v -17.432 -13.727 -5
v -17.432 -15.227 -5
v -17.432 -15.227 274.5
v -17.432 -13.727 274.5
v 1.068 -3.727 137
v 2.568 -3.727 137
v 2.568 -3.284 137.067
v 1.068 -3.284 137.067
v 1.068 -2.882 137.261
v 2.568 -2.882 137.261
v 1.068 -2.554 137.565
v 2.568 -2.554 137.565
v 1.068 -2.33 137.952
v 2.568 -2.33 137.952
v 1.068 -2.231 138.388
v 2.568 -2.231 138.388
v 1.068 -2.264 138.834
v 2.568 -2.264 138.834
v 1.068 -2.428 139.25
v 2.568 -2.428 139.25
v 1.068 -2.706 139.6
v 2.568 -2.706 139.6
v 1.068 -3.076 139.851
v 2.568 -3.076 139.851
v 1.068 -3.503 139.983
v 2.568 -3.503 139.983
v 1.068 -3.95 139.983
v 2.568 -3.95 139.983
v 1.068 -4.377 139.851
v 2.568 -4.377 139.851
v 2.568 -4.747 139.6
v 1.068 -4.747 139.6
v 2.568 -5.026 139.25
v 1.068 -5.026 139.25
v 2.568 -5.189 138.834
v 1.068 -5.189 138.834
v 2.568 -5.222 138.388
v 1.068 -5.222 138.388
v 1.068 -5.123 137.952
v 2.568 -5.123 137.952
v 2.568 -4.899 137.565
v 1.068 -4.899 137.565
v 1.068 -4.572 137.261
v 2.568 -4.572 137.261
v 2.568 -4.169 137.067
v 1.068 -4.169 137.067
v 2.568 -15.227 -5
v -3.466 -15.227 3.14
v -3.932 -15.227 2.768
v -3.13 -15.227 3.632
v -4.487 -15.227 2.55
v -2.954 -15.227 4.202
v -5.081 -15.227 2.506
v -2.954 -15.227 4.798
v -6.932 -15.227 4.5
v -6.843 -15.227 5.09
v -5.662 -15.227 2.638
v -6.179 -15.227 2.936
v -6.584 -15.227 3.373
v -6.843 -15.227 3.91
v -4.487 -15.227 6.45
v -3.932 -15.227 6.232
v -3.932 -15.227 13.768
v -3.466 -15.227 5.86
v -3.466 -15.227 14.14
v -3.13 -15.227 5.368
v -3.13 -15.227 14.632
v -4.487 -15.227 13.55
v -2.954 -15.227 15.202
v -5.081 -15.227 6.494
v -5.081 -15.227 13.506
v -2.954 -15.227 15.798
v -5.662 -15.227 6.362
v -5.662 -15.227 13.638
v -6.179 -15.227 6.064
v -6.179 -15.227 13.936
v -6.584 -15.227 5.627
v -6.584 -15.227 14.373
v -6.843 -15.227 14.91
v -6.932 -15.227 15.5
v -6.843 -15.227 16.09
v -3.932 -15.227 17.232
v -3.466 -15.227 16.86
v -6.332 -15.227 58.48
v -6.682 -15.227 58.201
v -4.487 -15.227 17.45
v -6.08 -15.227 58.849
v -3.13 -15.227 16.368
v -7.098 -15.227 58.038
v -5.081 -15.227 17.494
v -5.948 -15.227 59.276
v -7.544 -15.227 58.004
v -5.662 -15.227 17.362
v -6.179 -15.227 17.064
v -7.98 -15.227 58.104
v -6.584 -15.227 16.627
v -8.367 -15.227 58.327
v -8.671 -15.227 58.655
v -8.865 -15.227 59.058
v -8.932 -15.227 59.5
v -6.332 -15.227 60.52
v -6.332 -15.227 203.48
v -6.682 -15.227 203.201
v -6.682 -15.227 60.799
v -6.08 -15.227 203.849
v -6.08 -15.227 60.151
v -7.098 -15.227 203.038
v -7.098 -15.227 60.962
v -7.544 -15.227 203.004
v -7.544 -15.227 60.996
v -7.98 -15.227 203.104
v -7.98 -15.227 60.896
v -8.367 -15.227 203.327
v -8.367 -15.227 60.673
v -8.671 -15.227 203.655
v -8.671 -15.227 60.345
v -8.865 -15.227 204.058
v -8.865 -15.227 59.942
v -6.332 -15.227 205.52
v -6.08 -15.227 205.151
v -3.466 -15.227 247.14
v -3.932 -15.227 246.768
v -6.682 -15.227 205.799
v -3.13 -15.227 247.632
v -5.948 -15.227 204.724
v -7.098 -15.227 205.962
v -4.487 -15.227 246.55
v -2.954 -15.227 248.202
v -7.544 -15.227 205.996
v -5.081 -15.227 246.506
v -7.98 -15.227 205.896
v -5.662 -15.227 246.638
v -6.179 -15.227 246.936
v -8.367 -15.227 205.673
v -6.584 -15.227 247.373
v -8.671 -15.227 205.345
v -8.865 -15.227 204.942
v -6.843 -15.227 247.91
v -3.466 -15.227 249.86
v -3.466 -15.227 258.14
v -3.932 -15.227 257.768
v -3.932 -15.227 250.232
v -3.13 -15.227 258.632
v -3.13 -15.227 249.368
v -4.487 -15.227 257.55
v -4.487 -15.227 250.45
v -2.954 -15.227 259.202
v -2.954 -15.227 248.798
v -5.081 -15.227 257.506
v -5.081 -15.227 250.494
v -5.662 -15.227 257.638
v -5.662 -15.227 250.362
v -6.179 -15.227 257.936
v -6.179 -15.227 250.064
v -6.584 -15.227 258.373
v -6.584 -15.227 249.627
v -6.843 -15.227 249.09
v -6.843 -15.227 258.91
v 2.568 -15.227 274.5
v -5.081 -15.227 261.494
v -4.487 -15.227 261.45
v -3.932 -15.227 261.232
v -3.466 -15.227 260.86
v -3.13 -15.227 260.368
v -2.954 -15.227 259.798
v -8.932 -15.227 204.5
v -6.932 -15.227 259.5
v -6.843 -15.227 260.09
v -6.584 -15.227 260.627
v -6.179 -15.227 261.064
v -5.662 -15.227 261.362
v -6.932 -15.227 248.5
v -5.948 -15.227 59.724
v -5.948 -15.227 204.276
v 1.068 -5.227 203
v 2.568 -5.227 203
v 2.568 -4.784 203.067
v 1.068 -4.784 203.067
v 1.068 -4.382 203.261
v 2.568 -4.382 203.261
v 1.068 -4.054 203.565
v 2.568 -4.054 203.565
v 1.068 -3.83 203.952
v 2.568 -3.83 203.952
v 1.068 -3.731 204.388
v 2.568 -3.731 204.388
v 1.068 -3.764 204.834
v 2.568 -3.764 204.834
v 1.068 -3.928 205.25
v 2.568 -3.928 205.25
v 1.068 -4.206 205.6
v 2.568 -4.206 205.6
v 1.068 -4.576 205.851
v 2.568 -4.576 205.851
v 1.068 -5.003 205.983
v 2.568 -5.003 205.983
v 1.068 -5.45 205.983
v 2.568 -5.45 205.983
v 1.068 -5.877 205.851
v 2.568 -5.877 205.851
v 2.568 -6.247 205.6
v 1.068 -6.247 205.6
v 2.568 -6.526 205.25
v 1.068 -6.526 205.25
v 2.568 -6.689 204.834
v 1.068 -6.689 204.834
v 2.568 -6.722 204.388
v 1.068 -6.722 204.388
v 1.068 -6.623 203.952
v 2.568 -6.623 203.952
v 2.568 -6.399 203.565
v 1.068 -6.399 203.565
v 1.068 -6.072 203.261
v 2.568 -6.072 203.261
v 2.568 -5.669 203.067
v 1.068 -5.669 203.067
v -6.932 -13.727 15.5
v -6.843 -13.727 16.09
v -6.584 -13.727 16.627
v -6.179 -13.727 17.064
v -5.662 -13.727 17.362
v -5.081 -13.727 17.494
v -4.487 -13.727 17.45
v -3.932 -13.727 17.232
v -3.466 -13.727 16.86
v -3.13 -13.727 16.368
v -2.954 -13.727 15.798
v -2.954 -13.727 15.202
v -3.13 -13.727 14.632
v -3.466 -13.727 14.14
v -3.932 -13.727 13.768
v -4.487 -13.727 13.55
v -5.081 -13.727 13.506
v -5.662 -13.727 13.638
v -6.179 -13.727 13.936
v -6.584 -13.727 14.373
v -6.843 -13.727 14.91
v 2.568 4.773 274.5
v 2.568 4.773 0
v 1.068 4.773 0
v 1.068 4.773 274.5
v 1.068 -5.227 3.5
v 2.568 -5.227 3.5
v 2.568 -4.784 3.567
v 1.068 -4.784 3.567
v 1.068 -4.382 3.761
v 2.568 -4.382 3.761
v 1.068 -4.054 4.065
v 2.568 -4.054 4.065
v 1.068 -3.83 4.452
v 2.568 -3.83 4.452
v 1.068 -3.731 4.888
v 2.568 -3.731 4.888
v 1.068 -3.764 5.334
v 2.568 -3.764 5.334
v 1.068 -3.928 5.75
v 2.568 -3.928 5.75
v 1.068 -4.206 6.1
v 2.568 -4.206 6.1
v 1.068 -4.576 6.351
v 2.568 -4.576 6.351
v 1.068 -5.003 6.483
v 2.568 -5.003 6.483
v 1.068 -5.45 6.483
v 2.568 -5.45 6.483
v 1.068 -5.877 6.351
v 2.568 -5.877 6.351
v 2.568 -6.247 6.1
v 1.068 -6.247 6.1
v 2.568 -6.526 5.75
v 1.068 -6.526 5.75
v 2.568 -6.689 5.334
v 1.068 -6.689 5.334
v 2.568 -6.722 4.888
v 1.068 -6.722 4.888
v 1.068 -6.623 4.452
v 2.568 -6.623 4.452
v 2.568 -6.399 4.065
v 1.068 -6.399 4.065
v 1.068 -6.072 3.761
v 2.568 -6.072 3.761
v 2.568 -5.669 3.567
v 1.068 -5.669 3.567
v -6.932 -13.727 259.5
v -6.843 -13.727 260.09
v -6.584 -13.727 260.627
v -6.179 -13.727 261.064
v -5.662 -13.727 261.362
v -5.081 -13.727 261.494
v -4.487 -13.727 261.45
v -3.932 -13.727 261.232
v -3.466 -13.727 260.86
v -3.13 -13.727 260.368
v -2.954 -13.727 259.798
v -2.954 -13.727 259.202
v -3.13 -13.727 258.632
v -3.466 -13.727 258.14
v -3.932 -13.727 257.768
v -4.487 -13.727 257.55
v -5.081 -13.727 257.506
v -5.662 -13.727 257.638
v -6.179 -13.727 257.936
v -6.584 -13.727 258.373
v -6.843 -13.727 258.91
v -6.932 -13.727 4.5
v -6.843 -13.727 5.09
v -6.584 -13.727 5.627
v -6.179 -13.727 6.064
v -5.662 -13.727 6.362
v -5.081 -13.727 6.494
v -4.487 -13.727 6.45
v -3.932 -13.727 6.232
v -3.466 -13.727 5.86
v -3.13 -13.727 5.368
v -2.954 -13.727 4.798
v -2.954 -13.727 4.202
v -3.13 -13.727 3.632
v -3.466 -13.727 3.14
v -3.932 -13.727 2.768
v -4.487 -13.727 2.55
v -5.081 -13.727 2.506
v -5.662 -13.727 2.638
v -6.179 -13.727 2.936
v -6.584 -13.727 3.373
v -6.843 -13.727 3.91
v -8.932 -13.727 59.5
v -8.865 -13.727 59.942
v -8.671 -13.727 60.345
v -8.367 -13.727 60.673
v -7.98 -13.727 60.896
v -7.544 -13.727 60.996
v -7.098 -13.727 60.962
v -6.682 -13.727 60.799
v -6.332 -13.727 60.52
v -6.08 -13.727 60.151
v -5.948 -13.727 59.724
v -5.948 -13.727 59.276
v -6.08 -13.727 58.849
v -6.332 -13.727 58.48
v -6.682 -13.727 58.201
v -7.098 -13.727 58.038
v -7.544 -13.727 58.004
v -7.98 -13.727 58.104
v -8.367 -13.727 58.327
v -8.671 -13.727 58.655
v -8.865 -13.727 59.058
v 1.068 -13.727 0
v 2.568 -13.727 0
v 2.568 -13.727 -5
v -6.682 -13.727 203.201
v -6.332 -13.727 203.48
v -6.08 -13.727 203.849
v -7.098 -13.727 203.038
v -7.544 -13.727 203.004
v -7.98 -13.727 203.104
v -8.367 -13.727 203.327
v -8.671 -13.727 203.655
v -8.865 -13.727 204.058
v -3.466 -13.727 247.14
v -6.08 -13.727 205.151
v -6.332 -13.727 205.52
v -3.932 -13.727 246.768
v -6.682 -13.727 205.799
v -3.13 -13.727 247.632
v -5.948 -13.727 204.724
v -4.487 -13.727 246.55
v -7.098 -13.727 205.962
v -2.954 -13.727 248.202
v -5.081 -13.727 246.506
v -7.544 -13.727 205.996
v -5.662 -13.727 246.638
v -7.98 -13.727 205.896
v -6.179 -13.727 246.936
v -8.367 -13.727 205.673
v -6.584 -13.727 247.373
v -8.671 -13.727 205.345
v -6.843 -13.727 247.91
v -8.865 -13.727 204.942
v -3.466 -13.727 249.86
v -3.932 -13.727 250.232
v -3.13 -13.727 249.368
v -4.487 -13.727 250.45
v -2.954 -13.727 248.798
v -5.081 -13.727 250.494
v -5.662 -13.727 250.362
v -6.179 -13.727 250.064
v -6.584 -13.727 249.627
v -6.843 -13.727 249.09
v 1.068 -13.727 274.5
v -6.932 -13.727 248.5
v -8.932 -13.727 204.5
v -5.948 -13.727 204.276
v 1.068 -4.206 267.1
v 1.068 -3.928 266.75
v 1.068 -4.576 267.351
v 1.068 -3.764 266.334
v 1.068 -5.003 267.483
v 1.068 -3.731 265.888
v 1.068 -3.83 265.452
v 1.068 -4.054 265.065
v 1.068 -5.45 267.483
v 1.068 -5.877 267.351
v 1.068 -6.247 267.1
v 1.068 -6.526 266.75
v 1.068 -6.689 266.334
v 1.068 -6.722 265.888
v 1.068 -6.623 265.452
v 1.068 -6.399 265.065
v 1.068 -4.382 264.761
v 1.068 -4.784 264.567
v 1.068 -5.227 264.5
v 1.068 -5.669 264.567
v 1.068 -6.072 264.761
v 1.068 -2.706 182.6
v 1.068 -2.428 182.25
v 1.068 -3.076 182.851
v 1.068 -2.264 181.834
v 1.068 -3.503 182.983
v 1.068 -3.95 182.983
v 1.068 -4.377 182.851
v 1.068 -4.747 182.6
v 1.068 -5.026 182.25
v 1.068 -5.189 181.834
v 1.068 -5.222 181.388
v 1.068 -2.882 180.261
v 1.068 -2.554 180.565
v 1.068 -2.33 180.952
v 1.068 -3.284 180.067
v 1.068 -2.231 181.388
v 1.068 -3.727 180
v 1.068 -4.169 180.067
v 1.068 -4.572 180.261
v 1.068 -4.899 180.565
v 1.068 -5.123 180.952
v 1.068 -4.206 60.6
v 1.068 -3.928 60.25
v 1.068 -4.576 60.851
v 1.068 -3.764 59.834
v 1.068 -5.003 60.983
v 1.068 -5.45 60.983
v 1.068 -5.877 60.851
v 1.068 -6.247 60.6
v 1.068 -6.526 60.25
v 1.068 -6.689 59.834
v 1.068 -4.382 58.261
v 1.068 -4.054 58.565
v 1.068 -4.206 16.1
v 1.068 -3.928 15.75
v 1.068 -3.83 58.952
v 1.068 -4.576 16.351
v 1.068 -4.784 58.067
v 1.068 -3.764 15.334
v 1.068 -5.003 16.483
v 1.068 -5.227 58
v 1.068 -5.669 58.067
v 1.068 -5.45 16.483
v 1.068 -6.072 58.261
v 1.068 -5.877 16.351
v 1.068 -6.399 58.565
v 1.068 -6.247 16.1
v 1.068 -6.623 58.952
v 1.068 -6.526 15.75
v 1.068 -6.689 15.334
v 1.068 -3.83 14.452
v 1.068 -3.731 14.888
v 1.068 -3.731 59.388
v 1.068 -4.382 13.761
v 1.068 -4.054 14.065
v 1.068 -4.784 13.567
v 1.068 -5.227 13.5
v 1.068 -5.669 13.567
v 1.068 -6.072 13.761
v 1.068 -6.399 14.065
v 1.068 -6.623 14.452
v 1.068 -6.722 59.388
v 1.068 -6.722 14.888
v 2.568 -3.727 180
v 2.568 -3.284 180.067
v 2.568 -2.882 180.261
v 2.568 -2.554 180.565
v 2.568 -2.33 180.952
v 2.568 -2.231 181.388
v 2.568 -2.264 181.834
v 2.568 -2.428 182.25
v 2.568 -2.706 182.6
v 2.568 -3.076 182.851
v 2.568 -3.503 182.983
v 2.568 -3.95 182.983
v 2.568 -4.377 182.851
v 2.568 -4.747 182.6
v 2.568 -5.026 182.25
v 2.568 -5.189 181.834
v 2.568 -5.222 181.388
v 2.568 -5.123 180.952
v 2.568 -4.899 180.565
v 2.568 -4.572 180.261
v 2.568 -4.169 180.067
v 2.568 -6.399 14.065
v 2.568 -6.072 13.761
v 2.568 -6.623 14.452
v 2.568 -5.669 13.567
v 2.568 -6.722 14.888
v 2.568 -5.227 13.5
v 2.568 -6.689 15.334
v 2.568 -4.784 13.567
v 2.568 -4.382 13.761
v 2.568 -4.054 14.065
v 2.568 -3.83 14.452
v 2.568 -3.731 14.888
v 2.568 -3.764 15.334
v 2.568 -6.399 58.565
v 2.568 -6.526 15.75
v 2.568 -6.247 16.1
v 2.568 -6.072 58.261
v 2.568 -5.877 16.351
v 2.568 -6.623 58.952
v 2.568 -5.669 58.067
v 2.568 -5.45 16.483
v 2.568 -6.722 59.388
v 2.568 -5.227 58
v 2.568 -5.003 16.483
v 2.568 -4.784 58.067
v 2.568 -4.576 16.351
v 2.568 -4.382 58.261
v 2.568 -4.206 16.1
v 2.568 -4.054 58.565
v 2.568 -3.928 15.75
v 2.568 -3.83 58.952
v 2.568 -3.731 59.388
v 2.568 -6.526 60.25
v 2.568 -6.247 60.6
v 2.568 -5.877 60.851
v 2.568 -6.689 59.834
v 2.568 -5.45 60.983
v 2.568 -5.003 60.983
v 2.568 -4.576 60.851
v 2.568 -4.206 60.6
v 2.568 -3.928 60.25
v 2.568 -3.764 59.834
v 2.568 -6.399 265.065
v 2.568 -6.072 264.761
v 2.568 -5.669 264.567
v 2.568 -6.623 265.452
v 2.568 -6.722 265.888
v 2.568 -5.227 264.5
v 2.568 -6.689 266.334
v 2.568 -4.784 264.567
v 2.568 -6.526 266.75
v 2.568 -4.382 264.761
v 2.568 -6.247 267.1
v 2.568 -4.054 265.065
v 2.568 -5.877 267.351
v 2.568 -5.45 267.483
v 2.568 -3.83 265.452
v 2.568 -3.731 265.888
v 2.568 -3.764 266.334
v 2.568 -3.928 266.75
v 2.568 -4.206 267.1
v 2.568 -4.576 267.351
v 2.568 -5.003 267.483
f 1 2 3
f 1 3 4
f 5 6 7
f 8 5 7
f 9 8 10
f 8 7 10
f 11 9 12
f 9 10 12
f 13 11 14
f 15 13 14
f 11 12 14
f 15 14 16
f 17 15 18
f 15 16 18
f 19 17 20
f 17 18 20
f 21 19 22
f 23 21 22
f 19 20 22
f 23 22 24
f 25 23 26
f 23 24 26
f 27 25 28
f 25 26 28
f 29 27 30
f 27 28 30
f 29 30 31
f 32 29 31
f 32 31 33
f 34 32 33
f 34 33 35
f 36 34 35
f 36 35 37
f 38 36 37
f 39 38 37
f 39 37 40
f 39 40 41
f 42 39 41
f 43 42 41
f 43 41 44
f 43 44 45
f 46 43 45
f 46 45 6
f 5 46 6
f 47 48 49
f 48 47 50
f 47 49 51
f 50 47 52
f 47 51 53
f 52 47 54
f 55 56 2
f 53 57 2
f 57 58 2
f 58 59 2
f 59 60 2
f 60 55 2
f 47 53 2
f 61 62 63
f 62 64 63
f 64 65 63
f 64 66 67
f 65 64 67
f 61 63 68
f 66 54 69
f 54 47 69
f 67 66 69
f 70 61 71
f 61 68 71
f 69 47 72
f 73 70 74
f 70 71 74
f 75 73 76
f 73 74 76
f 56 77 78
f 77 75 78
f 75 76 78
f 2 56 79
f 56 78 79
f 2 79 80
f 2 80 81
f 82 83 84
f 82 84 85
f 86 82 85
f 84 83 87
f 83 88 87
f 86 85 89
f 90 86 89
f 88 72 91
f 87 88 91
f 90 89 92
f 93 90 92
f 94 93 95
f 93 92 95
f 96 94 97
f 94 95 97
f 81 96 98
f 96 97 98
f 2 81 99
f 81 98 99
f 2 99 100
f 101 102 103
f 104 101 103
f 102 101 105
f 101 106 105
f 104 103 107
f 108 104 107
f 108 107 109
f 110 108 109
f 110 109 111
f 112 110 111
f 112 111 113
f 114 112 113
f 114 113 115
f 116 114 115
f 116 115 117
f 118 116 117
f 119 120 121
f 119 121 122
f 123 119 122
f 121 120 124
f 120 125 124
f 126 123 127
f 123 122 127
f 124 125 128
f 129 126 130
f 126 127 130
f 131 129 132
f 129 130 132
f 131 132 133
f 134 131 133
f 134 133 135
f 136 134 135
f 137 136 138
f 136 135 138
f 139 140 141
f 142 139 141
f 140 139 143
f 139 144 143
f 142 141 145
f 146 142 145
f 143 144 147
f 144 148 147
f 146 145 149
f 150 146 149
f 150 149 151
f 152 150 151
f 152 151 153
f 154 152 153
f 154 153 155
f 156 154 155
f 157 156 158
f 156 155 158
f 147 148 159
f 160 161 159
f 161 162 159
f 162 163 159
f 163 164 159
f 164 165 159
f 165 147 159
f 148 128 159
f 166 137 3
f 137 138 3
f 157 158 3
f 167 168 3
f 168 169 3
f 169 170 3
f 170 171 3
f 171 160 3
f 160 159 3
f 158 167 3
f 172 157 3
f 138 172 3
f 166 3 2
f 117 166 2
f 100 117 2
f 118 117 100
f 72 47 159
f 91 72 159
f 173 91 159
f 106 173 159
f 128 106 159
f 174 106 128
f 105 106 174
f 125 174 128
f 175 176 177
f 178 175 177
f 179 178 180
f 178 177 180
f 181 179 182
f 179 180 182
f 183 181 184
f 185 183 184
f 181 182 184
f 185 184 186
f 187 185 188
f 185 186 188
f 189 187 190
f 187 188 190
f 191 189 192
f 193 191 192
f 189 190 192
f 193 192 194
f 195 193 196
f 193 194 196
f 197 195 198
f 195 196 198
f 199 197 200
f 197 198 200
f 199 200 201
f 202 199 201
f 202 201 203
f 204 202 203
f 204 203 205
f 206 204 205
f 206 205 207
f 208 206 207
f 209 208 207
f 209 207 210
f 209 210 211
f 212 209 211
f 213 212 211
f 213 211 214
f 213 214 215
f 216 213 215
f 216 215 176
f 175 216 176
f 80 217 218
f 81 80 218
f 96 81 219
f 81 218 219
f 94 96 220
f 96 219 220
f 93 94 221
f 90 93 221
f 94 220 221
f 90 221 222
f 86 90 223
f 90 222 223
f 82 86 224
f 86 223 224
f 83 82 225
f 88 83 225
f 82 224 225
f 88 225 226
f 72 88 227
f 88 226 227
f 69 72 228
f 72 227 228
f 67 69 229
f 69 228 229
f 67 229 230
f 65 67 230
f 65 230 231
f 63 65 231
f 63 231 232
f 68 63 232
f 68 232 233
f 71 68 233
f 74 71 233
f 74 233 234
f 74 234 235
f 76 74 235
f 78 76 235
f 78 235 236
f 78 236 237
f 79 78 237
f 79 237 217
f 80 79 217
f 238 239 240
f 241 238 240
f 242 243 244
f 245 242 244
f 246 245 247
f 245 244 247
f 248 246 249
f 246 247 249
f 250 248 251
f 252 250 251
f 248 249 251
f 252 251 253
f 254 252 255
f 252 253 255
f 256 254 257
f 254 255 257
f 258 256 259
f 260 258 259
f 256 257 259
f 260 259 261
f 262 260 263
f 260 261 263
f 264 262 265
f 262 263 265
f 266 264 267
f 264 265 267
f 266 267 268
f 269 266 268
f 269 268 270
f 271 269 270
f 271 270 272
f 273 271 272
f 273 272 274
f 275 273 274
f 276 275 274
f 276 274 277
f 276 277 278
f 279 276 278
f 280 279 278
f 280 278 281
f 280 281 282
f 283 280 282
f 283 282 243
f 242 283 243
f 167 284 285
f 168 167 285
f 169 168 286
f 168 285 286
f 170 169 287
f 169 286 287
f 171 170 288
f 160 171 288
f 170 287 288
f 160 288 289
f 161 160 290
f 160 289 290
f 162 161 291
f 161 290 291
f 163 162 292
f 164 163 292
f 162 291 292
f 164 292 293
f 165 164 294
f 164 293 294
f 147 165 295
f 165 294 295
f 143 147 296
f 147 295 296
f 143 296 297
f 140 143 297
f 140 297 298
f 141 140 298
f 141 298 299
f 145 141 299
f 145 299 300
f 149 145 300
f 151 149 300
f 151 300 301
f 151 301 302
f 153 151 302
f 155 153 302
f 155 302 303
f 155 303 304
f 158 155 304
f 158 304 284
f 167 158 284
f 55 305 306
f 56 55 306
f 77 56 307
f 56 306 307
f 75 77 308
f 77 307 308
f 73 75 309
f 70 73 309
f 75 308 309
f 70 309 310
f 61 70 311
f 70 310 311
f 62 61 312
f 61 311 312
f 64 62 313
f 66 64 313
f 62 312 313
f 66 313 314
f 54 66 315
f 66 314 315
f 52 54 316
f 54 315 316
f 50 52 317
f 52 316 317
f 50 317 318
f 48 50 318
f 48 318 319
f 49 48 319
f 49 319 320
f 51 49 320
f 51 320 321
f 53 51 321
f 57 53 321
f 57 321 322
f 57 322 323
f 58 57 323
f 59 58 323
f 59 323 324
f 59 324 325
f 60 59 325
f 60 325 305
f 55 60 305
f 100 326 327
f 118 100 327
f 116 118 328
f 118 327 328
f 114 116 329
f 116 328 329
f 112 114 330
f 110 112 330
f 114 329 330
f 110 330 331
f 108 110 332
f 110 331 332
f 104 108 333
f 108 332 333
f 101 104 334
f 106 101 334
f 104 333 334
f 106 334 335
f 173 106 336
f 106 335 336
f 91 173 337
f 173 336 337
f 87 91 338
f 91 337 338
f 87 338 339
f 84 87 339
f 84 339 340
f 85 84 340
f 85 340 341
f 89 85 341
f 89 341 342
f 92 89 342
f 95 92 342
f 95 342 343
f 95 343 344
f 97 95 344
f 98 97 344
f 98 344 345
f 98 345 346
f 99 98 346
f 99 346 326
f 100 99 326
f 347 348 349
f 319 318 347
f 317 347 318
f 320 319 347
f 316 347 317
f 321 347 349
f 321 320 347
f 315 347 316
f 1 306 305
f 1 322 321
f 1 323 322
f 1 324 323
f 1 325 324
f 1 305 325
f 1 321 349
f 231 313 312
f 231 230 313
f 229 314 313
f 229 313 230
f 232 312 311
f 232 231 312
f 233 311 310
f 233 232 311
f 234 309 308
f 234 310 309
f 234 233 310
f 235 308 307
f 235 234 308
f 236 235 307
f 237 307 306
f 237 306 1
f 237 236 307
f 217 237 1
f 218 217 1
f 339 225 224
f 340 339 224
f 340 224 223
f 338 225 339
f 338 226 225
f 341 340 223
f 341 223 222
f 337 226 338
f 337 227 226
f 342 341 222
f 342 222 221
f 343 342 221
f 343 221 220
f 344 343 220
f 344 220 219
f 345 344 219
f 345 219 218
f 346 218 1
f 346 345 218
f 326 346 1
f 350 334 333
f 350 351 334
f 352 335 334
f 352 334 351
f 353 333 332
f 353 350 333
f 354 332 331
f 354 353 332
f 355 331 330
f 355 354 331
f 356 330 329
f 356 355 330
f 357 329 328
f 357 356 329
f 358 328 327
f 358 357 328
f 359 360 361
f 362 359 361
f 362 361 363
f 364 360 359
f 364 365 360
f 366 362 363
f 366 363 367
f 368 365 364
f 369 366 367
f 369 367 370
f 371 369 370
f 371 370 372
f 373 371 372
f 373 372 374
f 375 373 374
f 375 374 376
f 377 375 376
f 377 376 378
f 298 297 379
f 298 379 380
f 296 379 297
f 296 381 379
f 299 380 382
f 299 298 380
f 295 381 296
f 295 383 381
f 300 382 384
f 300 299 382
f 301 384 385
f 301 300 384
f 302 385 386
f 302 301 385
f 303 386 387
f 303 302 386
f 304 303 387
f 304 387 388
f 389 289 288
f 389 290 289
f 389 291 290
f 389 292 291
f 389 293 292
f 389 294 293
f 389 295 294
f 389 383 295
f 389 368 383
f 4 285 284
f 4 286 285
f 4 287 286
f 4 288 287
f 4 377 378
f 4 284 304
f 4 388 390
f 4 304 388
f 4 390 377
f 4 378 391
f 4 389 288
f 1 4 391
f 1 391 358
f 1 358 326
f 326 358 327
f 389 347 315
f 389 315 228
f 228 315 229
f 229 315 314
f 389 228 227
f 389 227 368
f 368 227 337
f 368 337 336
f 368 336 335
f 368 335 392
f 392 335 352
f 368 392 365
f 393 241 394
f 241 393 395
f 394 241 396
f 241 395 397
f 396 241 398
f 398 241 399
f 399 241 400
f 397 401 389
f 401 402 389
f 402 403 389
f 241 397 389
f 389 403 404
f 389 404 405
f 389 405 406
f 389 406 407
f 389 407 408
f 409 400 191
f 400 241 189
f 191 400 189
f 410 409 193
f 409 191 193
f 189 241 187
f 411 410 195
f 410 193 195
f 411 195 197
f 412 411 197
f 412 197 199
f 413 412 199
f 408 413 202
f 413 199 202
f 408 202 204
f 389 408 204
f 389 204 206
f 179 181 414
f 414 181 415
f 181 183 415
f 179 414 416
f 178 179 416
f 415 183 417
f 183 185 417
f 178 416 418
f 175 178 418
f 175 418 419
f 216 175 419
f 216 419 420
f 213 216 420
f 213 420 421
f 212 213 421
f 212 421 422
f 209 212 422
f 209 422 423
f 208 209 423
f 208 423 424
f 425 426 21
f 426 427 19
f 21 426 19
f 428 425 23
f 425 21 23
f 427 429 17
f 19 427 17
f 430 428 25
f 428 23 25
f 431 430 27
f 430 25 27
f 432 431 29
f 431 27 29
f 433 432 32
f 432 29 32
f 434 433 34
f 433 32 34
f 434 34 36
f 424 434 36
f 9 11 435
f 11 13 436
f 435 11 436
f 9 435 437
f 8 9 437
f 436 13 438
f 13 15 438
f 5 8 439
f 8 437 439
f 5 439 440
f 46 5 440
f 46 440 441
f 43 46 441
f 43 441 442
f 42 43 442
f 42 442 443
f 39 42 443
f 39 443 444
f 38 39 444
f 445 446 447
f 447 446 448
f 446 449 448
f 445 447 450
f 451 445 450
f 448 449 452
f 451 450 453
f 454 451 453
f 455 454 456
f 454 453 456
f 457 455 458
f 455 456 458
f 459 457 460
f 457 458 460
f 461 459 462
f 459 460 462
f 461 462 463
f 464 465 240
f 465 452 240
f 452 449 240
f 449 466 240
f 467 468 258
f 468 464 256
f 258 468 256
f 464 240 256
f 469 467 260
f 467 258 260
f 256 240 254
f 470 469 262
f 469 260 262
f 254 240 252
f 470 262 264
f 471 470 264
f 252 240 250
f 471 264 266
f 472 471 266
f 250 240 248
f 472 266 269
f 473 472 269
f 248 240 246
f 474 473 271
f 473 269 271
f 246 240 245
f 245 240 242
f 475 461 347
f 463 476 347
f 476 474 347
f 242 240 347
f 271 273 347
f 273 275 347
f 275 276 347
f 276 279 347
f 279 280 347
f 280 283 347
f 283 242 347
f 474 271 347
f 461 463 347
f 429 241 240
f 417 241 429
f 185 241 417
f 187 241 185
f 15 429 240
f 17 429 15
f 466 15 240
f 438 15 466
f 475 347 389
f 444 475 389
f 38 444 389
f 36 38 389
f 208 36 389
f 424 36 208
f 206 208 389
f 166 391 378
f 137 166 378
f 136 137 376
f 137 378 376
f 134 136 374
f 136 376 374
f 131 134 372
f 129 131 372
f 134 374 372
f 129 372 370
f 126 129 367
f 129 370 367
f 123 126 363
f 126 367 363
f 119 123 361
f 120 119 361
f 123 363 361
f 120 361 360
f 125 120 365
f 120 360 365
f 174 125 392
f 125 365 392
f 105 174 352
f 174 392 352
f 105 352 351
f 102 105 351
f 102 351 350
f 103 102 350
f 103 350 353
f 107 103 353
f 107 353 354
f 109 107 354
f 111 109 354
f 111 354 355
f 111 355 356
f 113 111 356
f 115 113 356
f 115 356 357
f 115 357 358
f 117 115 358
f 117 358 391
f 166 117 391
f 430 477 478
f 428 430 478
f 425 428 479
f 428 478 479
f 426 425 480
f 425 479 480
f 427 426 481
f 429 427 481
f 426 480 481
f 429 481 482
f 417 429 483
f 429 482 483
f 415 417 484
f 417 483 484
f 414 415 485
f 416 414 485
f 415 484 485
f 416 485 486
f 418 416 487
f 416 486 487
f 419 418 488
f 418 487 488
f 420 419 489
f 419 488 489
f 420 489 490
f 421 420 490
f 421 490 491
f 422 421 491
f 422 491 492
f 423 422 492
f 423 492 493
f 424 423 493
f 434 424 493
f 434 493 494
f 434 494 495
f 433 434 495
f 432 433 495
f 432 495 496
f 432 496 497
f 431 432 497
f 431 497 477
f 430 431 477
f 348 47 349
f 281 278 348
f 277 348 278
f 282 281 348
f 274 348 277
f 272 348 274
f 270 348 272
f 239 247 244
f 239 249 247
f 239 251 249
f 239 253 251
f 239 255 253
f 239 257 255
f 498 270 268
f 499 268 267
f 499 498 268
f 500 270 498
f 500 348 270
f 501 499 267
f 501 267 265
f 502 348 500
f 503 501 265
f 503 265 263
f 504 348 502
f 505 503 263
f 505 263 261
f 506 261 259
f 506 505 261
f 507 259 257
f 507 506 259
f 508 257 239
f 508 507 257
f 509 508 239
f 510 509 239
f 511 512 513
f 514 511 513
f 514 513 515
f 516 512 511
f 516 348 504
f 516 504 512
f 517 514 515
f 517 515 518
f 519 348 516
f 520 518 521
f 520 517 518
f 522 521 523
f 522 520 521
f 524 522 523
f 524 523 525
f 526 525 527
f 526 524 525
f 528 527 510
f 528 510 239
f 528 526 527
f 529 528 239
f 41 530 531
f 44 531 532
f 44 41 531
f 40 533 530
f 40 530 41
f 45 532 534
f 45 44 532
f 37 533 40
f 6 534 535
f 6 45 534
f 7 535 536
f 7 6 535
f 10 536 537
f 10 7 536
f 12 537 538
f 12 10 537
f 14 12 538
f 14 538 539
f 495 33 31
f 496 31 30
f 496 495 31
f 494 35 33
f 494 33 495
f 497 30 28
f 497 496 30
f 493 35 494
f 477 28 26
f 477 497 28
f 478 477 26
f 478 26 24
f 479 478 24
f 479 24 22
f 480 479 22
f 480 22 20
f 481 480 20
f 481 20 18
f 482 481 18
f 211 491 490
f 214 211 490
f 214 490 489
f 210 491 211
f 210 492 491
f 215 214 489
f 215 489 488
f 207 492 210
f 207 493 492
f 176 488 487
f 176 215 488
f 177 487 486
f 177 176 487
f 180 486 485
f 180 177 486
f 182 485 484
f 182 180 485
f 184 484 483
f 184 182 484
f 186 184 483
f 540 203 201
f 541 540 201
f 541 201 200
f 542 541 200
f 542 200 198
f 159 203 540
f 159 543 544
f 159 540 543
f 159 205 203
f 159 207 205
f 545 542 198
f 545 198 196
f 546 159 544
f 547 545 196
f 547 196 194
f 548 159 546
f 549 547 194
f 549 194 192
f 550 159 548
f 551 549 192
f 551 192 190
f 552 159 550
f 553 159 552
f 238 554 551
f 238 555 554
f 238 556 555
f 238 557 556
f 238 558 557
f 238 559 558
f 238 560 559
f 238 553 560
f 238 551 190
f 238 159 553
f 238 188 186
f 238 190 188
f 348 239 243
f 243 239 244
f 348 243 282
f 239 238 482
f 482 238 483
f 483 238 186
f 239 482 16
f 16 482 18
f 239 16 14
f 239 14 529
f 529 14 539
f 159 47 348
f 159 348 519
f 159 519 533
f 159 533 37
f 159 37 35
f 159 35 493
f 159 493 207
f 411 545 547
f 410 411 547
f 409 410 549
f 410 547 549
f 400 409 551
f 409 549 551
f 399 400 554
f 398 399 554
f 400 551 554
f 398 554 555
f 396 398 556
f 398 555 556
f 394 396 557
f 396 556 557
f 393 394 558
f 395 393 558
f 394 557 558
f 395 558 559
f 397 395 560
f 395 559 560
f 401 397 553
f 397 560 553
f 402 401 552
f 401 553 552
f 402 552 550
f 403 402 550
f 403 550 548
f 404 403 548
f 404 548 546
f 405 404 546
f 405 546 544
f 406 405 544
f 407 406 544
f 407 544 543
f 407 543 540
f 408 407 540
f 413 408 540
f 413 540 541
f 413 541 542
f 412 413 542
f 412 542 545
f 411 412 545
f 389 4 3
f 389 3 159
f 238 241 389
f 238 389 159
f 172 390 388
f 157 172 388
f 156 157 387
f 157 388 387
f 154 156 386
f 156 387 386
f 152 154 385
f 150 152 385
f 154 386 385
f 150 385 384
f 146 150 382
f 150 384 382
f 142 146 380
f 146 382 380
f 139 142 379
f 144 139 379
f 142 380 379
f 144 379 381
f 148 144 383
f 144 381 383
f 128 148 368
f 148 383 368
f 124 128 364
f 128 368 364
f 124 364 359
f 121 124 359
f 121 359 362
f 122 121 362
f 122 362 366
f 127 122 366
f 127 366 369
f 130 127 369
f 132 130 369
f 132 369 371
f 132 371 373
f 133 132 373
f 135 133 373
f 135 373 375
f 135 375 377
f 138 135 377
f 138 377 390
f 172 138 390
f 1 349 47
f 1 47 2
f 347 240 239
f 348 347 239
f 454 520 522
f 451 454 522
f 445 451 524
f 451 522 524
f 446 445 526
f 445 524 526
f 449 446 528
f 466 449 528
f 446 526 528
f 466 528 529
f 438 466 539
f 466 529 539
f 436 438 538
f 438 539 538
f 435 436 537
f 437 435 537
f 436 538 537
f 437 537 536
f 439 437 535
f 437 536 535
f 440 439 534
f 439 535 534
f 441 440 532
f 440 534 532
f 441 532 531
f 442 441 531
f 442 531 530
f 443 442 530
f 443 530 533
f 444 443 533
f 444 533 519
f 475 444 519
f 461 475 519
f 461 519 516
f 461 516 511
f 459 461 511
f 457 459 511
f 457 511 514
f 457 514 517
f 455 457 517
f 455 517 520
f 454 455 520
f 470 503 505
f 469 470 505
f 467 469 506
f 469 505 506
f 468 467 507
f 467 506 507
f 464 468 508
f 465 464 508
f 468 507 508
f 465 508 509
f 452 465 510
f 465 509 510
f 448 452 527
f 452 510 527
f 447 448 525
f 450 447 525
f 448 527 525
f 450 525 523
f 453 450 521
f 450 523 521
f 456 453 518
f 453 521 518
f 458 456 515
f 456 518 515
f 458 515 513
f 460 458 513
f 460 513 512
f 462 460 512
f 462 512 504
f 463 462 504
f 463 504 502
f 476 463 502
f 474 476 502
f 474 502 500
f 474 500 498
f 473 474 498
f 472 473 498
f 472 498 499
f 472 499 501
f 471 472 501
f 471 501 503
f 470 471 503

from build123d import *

# Parameters (mm, degrees)
EXTRUSION1_DEPTH = 274.5
ESQUISSE2_R      = 1.5
ESQUISSE2_R_2    = 2
EXTRUSION2_DEPTH = 300
ESQUISSE3_R      = 1.5
EXTRUSION3_DEPTH = 10
ESQUISSE4_W      = 20
ESQUISSE4_H      = 1.5
EXTRUSION4_DEPTH = 5


with BuildPart() as part:
    # Esquisse1 → Extrusion1 (new body)
    with BuildSketch(Plane.XY):
        Polygon((-17.43168638, -13.726631579), (-17.43168638, -15.226631579), (2.56831362, -15.226631579), (2.56831362, 4.773368421), (1.06831362, 4.773368421), (1.06831362, -13.726631579), align=None)
    extrude(amount=EXTRUSION1_DEPTH)

    # Esquisse2 → Extrusion2 (cut)
    with BuildSketch(Plane(origin=(0, -13.726631579, 0), x_dir=(-1, 0, 0), z_dir=(0, 1, 0))):
        with Locations((7.43168638, 204.5)):
            Circle(ESQUISSE2_R)
        with Locations((4.93168638, 4.5)):
            Circle(ESQUISSE2_R_2)
        with Locations((4.93168638, 15.5)):
            Circle(ESQUISSE2_R_2)
        with Locations((4.93168638, 248.5)):
            Circle(ESQUISSE2_R_2)
        with Locations((4.93168638, 259.5)):
            Circle(ESQUISSE2_R_2)
        with Locations((7.43168638, 59.5)):
            Circle(ESQUISSE2_R)
    extrude(amount=-EXTRUSION2_DEPTH, mode=Mode.SUBTRACT)

    # Esquisse3 → Extrusion3 (cut)
    with BuildSketch(Plane(origin=(2.56831362, 0, 0), x_dir=(0, 0, -1), z_dir=(1, 0, 0))):
        with Locations((-266, -5.226631579)):
            Circle(ESQUISSE3_R)
        with Locations((-5, -5.226631579)):
            Circle(ESQUISSE3_R)
        with Locations((-15, -5.226631579)):
            Circle(ESQUISSE3_R)
        with Locations((-59.5, -5.226631579)):
            Circle(ESQUISSE3_R)
        with Locations((-204.5, -5.226631579)):
            Circle(ESQUISSE3_R)
        with Locations((-181.5, -3.726631579)):
            Circle(ESQUISSE3_R)
        with Locations((-138.5, -3.726631579)):
            Circle(ESQUISSE3_R)
    extrude(amount=-EXTRUSION3_DEPTH, mode=Mode.SUBTRACT)

    # Esquisse4 → Extrusion4 (add)
    with BuildSketch(Plane(origin=(0, 0, 0), x_dir=(-1, 0, 0), z_dir=(0, 0, -1))):
        with Locations((7.43168638, -14.476631579)):
            Rectangle(ESQUISSE4_W, ESQUISSE4_H)
    extrude(amount=EXTRUSION4_DEPTH)


solid = part.part
